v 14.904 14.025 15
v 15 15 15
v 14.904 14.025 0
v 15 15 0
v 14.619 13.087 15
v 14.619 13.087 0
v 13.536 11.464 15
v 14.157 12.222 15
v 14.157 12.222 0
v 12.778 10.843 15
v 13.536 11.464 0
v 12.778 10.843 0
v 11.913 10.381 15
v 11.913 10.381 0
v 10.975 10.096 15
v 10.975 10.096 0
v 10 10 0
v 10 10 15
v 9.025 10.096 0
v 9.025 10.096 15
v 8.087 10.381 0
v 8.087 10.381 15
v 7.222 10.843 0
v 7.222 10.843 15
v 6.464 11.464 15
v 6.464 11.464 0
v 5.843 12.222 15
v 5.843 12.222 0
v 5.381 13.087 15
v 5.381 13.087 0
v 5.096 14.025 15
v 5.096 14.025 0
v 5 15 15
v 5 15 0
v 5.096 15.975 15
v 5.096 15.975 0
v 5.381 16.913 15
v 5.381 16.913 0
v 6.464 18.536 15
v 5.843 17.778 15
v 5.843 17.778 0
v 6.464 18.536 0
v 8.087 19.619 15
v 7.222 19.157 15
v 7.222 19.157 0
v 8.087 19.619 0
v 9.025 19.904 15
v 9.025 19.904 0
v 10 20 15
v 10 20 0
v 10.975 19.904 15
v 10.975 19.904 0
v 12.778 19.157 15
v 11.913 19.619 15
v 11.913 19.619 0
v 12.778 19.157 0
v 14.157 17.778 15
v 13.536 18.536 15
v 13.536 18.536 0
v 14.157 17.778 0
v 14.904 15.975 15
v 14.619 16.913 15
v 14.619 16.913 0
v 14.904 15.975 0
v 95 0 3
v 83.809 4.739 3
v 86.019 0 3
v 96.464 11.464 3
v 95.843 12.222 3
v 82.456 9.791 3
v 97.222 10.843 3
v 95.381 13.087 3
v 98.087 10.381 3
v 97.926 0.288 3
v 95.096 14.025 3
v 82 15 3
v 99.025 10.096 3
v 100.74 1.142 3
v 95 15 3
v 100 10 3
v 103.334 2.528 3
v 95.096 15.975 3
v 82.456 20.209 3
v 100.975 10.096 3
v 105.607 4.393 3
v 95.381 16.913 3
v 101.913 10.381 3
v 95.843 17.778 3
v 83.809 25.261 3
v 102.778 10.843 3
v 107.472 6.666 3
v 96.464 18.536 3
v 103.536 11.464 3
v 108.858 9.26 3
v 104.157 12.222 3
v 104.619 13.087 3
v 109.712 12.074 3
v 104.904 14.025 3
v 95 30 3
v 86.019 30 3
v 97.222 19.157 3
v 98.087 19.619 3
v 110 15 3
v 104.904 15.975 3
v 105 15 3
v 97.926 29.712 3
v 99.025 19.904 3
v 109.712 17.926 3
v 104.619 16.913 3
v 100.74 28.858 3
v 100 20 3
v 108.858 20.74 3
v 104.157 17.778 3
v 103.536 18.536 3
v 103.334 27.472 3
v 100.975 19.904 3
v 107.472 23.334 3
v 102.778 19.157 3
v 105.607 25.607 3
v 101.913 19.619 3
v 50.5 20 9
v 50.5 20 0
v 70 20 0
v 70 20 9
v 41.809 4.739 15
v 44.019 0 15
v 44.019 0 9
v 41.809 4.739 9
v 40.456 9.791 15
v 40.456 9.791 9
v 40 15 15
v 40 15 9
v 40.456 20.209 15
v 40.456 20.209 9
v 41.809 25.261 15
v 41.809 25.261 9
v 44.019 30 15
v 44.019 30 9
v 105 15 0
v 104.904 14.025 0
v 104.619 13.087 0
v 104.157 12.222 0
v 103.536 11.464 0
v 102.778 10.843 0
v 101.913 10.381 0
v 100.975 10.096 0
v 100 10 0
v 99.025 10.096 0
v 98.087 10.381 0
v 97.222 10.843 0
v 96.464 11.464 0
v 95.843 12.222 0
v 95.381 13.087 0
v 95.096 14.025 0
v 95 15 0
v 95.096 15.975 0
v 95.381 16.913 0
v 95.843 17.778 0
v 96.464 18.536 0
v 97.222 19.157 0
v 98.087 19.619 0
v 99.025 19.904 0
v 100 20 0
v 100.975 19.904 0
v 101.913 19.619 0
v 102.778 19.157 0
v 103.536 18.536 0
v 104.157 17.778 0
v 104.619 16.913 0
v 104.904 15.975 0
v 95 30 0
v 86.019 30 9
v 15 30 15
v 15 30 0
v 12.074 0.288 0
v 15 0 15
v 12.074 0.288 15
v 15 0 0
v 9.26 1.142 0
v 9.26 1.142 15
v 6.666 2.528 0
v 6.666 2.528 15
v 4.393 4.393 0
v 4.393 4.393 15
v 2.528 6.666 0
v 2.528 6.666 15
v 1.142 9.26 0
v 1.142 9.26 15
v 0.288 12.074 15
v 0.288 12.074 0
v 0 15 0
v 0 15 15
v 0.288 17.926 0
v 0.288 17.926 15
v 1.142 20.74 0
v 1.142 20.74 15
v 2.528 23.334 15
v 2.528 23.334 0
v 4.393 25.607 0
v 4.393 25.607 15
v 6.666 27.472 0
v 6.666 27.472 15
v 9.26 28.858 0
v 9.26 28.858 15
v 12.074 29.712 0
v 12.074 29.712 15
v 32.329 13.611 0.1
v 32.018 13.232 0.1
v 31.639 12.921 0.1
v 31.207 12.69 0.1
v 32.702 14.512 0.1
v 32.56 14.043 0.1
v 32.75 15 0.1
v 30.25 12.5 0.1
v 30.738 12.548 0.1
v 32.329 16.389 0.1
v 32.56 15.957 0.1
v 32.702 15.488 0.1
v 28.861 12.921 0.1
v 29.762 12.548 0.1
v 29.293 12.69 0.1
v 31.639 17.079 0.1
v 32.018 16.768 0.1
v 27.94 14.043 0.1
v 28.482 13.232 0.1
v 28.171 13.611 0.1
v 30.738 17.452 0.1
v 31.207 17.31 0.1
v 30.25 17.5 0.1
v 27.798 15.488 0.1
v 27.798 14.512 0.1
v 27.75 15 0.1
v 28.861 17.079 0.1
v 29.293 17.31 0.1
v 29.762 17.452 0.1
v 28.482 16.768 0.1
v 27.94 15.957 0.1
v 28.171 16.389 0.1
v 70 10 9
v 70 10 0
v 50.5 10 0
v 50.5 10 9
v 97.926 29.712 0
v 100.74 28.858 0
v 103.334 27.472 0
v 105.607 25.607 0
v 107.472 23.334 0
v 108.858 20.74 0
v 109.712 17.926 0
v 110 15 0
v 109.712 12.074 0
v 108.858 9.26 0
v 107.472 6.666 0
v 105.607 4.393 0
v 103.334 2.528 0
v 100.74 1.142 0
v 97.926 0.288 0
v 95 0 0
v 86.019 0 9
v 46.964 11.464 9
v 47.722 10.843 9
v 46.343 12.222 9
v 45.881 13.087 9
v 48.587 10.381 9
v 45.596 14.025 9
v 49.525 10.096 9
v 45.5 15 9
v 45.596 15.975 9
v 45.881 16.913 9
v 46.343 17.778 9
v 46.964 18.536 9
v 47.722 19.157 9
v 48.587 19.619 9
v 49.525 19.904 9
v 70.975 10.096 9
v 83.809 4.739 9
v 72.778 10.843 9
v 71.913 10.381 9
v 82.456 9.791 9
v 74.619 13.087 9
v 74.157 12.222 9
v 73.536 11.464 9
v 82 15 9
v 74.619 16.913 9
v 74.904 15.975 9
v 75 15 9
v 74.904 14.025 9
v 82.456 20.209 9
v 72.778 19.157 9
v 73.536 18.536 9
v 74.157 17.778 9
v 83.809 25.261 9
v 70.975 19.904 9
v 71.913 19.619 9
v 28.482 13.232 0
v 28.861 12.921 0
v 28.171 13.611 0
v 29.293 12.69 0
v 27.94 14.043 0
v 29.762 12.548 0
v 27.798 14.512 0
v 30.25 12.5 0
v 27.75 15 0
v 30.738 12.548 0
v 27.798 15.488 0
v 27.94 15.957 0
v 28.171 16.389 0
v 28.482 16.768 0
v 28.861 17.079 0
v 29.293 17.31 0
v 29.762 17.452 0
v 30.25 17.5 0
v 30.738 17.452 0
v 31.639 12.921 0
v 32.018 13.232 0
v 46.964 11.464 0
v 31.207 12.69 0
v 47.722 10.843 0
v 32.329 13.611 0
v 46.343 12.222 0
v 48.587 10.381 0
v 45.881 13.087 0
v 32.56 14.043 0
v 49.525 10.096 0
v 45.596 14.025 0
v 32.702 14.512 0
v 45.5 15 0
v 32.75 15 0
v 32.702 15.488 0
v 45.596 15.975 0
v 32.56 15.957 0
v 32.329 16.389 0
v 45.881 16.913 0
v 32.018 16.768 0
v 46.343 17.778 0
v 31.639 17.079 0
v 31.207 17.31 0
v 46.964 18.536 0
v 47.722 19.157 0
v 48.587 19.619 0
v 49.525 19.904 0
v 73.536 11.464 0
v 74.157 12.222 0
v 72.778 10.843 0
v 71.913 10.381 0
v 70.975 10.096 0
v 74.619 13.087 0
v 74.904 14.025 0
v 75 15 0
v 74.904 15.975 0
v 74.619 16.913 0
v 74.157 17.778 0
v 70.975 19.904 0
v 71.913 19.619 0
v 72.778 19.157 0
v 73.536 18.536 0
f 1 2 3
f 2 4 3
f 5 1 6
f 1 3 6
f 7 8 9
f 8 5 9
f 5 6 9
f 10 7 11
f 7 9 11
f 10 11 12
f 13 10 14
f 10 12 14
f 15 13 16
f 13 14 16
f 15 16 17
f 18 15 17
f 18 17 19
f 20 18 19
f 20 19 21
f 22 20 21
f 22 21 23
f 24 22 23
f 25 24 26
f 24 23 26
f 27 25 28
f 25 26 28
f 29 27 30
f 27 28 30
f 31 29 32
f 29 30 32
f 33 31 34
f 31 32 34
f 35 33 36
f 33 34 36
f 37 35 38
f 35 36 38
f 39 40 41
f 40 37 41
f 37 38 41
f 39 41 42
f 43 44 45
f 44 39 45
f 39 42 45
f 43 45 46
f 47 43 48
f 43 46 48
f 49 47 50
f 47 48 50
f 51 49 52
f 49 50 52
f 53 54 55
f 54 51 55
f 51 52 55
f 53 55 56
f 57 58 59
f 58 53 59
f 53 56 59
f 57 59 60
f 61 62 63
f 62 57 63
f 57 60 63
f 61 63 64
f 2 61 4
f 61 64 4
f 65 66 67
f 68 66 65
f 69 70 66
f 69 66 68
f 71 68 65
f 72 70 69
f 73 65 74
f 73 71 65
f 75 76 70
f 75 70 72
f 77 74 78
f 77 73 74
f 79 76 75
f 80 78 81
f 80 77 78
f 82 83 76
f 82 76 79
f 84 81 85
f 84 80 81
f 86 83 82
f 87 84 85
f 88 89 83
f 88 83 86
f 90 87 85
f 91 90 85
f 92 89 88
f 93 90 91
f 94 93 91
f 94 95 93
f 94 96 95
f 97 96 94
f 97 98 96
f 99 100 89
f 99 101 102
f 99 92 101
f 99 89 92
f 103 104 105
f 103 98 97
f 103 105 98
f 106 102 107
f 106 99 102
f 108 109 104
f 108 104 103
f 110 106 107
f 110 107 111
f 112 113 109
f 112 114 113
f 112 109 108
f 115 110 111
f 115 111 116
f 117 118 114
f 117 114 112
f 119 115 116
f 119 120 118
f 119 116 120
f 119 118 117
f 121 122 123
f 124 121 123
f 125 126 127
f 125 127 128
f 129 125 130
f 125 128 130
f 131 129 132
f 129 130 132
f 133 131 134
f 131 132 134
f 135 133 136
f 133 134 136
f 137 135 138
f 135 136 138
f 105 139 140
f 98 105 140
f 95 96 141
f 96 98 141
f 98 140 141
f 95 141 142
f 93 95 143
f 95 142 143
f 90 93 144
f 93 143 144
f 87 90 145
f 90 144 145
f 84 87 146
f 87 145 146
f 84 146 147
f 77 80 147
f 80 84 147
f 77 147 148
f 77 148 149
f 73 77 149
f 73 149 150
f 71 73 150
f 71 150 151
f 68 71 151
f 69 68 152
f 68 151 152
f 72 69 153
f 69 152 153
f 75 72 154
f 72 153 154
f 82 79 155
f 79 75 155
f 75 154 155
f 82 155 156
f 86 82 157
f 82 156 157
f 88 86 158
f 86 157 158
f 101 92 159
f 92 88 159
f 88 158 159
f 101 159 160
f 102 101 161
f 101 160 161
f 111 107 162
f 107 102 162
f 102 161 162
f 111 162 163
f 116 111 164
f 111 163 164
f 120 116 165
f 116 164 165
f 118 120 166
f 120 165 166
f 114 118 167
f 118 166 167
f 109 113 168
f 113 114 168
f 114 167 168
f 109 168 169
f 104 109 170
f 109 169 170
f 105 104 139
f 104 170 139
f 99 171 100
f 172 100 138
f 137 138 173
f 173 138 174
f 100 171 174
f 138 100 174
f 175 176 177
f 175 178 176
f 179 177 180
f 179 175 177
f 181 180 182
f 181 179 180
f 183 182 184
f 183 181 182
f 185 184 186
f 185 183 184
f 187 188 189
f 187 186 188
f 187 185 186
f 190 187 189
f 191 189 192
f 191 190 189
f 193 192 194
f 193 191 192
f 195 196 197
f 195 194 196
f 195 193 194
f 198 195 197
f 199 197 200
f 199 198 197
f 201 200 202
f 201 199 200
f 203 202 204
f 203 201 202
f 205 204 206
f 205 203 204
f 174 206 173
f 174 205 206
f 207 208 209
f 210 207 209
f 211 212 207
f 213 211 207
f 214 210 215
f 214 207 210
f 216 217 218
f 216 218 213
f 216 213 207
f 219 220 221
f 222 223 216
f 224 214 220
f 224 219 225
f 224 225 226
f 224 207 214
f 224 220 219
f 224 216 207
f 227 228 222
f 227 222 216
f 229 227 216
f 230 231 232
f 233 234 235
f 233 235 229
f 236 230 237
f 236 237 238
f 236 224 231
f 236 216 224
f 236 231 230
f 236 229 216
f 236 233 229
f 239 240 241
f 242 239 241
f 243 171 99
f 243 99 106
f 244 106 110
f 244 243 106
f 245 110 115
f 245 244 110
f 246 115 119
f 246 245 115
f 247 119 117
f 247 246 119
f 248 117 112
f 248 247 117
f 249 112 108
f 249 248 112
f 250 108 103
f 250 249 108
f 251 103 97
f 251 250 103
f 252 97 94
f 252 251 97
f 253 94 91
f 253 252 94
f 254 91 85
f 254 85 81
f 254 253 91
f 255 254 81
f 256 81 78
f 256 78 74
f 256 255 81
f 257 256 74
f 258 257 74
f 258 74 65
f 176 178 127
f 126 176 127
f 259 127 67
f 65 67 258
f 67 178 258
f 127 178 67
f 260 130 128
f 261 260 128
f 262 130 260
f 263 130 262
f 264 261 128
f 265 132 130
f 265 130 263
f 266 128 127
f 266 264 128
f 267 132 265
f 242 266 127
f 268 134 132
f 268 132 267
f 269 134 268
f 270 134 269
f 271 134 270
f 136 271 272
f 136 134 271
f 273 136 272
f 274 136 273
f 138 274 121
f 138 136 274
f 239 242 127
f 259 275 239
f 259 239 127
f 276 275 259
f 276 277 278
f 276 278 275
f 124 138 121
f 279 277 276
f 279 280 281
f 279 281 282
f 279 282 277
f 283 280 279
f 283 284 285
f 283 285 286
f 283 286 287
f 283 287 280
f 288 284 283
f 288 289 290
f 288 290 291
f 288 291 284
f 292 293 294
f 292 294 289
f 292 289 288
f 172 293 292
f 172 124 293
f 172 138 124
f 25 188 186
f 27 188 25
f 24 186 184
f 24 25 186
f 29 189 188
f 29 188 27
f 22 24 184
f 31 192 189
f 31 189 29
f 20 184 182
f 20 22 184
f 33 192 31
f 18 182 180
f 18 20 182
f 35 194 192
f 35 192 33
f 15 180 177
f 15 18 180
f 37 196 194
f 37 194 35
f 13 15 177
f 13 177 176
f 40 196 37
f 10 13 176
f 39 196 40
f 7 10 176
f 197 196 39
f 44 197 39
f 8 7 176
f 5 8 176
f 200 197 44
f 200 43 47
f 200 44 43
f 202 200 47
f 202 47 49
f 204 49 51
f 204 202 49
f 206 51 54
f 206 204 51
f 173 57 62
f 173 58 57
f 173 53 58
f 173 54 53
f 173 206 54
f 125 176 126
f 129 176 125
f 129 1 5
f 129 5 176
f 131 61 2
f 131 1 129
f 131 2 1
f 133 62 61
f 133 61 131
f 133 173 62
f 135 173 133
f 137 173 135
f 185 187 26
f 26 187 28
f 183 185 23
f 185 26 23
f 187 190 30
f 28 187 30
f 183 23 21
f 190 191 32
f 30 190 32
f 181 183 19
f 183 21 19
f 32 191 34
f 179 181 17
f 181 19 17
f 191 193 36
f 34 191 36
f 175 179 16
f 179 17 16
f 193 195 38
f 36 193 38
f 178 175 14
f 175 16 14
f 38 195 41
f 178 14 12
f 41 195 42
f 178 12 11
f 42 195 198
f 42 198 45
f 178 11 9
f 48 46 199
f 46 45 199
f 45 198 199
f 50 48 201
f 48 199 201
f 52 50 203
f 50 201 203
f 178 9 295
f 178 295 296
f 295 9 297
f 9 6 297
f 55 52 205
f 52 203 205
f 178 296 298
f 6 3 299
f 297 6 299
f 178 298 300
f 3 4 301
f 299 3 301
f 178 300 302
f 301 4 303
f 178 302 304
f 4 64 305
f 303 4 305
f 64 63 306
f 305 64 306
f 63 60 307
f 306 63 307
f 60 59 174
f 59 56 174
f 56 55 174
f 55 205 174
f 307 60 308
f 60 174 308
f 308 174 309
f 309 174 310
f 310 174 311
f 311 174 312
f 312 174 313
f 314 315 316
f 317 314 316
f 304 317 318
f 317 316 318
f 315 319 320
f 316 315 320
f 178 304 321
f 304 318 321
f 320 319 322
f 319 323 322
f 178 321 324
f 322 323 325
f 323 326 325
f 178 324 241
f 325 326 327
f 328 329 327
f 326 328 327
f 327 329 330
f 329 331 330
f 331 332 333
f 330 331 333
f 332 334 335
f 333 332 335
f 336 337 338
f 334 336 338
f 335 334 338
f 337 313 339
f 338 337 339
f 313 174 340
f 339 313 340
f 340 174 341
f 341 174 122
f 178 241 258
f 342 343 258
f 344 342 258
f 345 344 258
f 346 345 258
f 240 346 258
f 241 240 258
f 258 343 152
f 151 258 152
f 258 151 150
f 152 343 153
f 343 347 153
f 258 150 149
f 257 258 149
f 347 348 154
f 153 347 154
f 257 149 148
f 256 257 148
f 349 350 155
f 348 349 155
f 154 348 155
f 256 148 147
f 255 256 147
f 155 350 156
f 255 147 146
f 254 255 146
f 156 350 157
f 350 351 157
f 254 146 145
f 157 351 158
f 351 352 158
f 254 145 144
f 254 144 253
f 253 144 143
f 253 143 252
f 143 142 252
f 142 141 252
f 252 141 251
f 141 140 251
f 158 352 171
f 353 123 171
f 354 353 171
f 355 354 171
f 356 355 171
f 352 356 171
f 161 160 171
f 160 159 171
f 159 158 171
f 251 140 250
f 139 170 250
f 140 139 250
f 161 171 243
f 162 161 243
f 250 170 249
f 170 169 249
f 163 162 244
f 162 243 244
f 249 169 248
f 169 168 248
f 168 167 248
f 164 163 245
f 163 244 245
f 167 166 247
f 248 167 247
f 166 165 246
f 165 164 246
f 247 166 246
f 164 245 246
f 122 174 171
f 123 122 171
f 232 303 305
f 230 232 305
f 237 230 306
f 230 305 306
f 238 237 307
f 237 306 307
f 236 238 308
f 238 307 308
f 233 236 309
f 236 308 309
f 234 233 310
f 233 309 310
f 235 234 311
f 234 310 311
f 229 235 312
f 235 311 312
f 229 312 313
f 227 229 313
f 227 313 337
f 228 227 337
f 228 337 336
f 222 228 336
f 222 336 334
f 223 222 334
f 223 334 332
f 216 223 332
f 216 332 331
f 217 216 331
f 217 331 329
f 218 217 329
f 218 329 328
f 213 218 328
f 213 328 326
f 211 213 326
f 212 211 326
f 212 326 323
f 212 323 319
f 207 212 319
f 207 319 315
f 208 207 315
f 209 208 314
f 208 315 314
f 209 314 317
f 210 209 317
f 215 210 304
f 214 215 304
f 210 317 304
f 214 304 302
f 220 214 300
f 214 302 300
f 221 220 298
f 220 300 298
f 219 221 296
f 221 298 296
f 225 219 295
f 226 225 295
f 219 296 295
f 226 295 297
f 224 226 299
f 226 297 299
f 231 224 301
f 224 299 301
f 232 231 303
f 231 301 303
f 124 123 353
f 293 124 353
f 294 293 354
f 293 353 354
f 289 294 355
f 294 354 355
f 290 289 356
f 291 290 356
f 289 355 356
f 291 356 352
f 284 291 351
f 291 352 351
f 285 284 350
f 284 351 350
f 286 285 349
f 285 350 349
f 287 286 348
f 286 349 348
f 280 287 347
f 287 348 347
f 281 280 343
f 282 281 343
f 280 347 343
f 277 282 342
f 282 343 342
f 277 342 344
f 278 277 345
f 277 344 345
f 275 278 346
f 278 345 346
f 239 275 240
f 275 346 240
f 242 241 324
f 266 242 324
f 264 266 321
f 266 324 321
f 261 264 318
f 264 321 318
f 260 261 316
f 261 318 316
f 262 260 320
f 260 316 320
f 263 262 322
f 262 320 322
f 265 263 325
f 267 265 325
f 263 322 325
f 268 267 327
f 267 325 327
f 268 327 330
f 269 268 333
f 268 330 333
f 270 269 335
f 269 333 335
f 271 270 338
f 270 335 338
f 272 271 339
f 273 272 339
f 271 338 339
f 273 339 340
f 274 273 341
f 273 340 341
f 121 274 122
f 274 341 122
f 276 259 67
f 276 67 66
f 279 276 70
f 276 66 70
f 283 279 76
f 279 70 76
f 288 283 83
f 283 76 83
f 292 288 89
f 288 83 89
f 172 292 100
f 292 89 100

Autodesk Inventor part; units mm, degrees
ref_plane "YZ Plane" through (0, 0, 0) normal (1, 0, 0) x (0, 1, 0)
ref_plane "XZ Plane" through (0, 0, 0) normal (0, 1, 0) x (-1, 0, 0)
ref_plane "XY Plane" through (0, 0, 0) normal (0, 0, 1) x (1, 0, 0)
sketch "Sketch1" plane through (0, 0, 0) normal (0, 0, 1) x (1, 0, 0)
  line L0 (15, 0) -> (95, 0)
  line L1 (110, 15) -> (110, 15)
  line L2 (95, 30) -> (15, 30)
  line L3 (0, 15) -> (0, 15)
  circle A0 centre (10, 15) radius 5
  circle A1 centre (100, 15) radius 5
  arc A2 (110, 15) -> (95, 30) centre (95, 15) ccw
  arc A3 (95, 0) -> (110, 15) centre (95, 15) ccw
  arc A4 (0, 15) -> (15, 0) centre (15, 15) ccw
  arc A5 (15, 30) -> (0, 15) centre (15, 15) ccw
  point P0 (0, 0)
  point P1 (110, 0)
  point P2 (110, 30)
  point P3 (0, 15)
  dimension "d1" = 30
  dimension "d14" = 10
  dimension "d15" = 10
  dimension "d16" = 10
  dimension "d17" = 90
  dimension "d18" = 15
  dimension "d21" = 15
extrude "Extrusion1" add sketch "Sketch1" along normal blind 3
sketch "Sketch2" plane through (0, 0, 3) normal (0, 0, 1) x (1, 0, 0)
  arc A0 (95, 0) -> (95, 30) centre (95, 15) ccw projected
  line L0 (95, 30) -> (15, 30) projected
  arc A1 (15, 30) -> (15, 0) centre (15, 15) ccw projected
  line L1 (15, 0) -> (95, 0) projected
  circle A2 centre (100, 15) radius 5 projected
  circle A3 centre (10, 15) radius 5 projected
  circle A4 centre (100, 15) radius 5 projected
  line L2 (15, 0) -> (95, 0) projected
  line L3 (95, 30) -> (15, 30) projected
  circle A5 centre (112, 15) radius 30
  point P0 (0, 0)
  point P1 (86.0192, 0)
  point P2 (86.0192, 30)
  dimension "d32" = 60
  dimension "d33" = 12
extrude "Extrusion2" add sketch "Sketch2" along normal blind 6 contours L1 A1 L0 A5
sketch "Sketch3" plane through (0, 0, 0) normal (0, 0, -1) x (-1, 0, 0)
  arc A0 (-95, 30) -> (-95, 0) centre (-95, 15) ccw projected
  line L0 (-15, 0) -> (-95, 0) projected
  arc A1 (-15, 0) -> (-15, 30) centre (-15, 15) ccw projected
  line L1 (-95, 30) -> (-15, 30) projected
  circle A2 centre (-100, 15) radius 5 projected
  circle A3 centre (-10, 15) radius 5 projected
  circle A4 centre (-50.5, 15) radius 5
  circle A5 centre (-70, 15) radius 5
  circle A6 centre (-10, 15) radius 5 projected
  line L2 (-50.5, 20) -> (-70, 20)
  line L3 (-70, 10) -> (-50.5, 10)
  point P0 (0, 0)
  dimension "d26" = 40.5
  dimension "d27" = 30
  dimension "d28" = 10
extrude "Extrusion3" cut sketch "Sketch3" against normal up to surface (9 mm away) contours A4 | A4 L3 A5 L2 | A5
sketch "Sketch4" plane through (0, 0, 9) normal (0, 0, 1) x (1, 0, 0)
  line L0 (70, 10) -> (50.5, 10) projected
  arc A0 (50.5, 20) -> (50.5, 10) centre (50.5, 15) ccw projected
  line L1 (50.5, 20) -> (70, 20) projected
  arc A1 (70, 10) -> (70, 20) centre (70, 15) ccw projected
  line L2 (15, 0) -> (86.0192, 0) projected
  arc A2 (86.0192, 30) -> (86.0192, 0) centre (112, 15) ccw projected
  line L3 (86.0192, 30) -> (15, 30) projected
  arc A3 (15, 30) -> (15, 0) centre (15, 15) ccw projected
  circle A4 centre (10, 15) radius 5 projected
  circle A5 centre (70, 15) radius 15
  line L4 (15, 0) -> (95, 0) projected
  circle A6 centre (70, 15) radius 30
  point P0 (0, 0)
  point P1 (44.0192, 0)
  point P2 (44.0192, 30)
  dimension "d34" = 60
  dimension "d35" = 60
extrude "Extrusion4" add sketch "Sketch4" along normal blind 6 contours L2 A3 L3 A6
sketch "Sketch5" plane through (0, 0, 0) normal (0, 0, -1) x (-1, 0, 0)
  circle A0 centre (-30.25, 15) radius 2.5
  arc A1 (-50.5, 10) -> (-50.5, 20) centre (-50.5, 15) ccw projected
  circle A2 centre (-10, 15) radius 5 projected
  point P0 (0, 0)
  dimension "d38" = 5
  dimension "d39" = 40.5
  dimension "d40" = 20.25
extrude "Extrusion5" cut sketch "Sketch5" against normal blind 0.1 contours A0
equation "\"d1\" = d0"
equation "\"d14\" = d6"
equation "\"d15\" = d14"
equation "\"d16\" = d15"
equation "\"d18\" = 0.5 * d1"
equation "\"d21\" = 0.5 * d1"
equation "\"d19\" = d11"
equation "\"d32\" = 2 * d0"
equation "\"d33\" = 0.4 * d0"
equation "\"d22\" = 2 * d11"
equation "\"d26\" = 1.35 * d0"
equation "\"d27\" = d0"
equation "\"d34\" = 2 * d0"
equation "\"d35\" = 2 * d0"
equation "\"d36\" = 2 * d11"
equation "\"d40\" = 0.5 * d39"
equation "\"d6\" = 10"
equation "\"d11\" = 3"
equation "\"d0\" = 30"
properties part number "GripP4"
